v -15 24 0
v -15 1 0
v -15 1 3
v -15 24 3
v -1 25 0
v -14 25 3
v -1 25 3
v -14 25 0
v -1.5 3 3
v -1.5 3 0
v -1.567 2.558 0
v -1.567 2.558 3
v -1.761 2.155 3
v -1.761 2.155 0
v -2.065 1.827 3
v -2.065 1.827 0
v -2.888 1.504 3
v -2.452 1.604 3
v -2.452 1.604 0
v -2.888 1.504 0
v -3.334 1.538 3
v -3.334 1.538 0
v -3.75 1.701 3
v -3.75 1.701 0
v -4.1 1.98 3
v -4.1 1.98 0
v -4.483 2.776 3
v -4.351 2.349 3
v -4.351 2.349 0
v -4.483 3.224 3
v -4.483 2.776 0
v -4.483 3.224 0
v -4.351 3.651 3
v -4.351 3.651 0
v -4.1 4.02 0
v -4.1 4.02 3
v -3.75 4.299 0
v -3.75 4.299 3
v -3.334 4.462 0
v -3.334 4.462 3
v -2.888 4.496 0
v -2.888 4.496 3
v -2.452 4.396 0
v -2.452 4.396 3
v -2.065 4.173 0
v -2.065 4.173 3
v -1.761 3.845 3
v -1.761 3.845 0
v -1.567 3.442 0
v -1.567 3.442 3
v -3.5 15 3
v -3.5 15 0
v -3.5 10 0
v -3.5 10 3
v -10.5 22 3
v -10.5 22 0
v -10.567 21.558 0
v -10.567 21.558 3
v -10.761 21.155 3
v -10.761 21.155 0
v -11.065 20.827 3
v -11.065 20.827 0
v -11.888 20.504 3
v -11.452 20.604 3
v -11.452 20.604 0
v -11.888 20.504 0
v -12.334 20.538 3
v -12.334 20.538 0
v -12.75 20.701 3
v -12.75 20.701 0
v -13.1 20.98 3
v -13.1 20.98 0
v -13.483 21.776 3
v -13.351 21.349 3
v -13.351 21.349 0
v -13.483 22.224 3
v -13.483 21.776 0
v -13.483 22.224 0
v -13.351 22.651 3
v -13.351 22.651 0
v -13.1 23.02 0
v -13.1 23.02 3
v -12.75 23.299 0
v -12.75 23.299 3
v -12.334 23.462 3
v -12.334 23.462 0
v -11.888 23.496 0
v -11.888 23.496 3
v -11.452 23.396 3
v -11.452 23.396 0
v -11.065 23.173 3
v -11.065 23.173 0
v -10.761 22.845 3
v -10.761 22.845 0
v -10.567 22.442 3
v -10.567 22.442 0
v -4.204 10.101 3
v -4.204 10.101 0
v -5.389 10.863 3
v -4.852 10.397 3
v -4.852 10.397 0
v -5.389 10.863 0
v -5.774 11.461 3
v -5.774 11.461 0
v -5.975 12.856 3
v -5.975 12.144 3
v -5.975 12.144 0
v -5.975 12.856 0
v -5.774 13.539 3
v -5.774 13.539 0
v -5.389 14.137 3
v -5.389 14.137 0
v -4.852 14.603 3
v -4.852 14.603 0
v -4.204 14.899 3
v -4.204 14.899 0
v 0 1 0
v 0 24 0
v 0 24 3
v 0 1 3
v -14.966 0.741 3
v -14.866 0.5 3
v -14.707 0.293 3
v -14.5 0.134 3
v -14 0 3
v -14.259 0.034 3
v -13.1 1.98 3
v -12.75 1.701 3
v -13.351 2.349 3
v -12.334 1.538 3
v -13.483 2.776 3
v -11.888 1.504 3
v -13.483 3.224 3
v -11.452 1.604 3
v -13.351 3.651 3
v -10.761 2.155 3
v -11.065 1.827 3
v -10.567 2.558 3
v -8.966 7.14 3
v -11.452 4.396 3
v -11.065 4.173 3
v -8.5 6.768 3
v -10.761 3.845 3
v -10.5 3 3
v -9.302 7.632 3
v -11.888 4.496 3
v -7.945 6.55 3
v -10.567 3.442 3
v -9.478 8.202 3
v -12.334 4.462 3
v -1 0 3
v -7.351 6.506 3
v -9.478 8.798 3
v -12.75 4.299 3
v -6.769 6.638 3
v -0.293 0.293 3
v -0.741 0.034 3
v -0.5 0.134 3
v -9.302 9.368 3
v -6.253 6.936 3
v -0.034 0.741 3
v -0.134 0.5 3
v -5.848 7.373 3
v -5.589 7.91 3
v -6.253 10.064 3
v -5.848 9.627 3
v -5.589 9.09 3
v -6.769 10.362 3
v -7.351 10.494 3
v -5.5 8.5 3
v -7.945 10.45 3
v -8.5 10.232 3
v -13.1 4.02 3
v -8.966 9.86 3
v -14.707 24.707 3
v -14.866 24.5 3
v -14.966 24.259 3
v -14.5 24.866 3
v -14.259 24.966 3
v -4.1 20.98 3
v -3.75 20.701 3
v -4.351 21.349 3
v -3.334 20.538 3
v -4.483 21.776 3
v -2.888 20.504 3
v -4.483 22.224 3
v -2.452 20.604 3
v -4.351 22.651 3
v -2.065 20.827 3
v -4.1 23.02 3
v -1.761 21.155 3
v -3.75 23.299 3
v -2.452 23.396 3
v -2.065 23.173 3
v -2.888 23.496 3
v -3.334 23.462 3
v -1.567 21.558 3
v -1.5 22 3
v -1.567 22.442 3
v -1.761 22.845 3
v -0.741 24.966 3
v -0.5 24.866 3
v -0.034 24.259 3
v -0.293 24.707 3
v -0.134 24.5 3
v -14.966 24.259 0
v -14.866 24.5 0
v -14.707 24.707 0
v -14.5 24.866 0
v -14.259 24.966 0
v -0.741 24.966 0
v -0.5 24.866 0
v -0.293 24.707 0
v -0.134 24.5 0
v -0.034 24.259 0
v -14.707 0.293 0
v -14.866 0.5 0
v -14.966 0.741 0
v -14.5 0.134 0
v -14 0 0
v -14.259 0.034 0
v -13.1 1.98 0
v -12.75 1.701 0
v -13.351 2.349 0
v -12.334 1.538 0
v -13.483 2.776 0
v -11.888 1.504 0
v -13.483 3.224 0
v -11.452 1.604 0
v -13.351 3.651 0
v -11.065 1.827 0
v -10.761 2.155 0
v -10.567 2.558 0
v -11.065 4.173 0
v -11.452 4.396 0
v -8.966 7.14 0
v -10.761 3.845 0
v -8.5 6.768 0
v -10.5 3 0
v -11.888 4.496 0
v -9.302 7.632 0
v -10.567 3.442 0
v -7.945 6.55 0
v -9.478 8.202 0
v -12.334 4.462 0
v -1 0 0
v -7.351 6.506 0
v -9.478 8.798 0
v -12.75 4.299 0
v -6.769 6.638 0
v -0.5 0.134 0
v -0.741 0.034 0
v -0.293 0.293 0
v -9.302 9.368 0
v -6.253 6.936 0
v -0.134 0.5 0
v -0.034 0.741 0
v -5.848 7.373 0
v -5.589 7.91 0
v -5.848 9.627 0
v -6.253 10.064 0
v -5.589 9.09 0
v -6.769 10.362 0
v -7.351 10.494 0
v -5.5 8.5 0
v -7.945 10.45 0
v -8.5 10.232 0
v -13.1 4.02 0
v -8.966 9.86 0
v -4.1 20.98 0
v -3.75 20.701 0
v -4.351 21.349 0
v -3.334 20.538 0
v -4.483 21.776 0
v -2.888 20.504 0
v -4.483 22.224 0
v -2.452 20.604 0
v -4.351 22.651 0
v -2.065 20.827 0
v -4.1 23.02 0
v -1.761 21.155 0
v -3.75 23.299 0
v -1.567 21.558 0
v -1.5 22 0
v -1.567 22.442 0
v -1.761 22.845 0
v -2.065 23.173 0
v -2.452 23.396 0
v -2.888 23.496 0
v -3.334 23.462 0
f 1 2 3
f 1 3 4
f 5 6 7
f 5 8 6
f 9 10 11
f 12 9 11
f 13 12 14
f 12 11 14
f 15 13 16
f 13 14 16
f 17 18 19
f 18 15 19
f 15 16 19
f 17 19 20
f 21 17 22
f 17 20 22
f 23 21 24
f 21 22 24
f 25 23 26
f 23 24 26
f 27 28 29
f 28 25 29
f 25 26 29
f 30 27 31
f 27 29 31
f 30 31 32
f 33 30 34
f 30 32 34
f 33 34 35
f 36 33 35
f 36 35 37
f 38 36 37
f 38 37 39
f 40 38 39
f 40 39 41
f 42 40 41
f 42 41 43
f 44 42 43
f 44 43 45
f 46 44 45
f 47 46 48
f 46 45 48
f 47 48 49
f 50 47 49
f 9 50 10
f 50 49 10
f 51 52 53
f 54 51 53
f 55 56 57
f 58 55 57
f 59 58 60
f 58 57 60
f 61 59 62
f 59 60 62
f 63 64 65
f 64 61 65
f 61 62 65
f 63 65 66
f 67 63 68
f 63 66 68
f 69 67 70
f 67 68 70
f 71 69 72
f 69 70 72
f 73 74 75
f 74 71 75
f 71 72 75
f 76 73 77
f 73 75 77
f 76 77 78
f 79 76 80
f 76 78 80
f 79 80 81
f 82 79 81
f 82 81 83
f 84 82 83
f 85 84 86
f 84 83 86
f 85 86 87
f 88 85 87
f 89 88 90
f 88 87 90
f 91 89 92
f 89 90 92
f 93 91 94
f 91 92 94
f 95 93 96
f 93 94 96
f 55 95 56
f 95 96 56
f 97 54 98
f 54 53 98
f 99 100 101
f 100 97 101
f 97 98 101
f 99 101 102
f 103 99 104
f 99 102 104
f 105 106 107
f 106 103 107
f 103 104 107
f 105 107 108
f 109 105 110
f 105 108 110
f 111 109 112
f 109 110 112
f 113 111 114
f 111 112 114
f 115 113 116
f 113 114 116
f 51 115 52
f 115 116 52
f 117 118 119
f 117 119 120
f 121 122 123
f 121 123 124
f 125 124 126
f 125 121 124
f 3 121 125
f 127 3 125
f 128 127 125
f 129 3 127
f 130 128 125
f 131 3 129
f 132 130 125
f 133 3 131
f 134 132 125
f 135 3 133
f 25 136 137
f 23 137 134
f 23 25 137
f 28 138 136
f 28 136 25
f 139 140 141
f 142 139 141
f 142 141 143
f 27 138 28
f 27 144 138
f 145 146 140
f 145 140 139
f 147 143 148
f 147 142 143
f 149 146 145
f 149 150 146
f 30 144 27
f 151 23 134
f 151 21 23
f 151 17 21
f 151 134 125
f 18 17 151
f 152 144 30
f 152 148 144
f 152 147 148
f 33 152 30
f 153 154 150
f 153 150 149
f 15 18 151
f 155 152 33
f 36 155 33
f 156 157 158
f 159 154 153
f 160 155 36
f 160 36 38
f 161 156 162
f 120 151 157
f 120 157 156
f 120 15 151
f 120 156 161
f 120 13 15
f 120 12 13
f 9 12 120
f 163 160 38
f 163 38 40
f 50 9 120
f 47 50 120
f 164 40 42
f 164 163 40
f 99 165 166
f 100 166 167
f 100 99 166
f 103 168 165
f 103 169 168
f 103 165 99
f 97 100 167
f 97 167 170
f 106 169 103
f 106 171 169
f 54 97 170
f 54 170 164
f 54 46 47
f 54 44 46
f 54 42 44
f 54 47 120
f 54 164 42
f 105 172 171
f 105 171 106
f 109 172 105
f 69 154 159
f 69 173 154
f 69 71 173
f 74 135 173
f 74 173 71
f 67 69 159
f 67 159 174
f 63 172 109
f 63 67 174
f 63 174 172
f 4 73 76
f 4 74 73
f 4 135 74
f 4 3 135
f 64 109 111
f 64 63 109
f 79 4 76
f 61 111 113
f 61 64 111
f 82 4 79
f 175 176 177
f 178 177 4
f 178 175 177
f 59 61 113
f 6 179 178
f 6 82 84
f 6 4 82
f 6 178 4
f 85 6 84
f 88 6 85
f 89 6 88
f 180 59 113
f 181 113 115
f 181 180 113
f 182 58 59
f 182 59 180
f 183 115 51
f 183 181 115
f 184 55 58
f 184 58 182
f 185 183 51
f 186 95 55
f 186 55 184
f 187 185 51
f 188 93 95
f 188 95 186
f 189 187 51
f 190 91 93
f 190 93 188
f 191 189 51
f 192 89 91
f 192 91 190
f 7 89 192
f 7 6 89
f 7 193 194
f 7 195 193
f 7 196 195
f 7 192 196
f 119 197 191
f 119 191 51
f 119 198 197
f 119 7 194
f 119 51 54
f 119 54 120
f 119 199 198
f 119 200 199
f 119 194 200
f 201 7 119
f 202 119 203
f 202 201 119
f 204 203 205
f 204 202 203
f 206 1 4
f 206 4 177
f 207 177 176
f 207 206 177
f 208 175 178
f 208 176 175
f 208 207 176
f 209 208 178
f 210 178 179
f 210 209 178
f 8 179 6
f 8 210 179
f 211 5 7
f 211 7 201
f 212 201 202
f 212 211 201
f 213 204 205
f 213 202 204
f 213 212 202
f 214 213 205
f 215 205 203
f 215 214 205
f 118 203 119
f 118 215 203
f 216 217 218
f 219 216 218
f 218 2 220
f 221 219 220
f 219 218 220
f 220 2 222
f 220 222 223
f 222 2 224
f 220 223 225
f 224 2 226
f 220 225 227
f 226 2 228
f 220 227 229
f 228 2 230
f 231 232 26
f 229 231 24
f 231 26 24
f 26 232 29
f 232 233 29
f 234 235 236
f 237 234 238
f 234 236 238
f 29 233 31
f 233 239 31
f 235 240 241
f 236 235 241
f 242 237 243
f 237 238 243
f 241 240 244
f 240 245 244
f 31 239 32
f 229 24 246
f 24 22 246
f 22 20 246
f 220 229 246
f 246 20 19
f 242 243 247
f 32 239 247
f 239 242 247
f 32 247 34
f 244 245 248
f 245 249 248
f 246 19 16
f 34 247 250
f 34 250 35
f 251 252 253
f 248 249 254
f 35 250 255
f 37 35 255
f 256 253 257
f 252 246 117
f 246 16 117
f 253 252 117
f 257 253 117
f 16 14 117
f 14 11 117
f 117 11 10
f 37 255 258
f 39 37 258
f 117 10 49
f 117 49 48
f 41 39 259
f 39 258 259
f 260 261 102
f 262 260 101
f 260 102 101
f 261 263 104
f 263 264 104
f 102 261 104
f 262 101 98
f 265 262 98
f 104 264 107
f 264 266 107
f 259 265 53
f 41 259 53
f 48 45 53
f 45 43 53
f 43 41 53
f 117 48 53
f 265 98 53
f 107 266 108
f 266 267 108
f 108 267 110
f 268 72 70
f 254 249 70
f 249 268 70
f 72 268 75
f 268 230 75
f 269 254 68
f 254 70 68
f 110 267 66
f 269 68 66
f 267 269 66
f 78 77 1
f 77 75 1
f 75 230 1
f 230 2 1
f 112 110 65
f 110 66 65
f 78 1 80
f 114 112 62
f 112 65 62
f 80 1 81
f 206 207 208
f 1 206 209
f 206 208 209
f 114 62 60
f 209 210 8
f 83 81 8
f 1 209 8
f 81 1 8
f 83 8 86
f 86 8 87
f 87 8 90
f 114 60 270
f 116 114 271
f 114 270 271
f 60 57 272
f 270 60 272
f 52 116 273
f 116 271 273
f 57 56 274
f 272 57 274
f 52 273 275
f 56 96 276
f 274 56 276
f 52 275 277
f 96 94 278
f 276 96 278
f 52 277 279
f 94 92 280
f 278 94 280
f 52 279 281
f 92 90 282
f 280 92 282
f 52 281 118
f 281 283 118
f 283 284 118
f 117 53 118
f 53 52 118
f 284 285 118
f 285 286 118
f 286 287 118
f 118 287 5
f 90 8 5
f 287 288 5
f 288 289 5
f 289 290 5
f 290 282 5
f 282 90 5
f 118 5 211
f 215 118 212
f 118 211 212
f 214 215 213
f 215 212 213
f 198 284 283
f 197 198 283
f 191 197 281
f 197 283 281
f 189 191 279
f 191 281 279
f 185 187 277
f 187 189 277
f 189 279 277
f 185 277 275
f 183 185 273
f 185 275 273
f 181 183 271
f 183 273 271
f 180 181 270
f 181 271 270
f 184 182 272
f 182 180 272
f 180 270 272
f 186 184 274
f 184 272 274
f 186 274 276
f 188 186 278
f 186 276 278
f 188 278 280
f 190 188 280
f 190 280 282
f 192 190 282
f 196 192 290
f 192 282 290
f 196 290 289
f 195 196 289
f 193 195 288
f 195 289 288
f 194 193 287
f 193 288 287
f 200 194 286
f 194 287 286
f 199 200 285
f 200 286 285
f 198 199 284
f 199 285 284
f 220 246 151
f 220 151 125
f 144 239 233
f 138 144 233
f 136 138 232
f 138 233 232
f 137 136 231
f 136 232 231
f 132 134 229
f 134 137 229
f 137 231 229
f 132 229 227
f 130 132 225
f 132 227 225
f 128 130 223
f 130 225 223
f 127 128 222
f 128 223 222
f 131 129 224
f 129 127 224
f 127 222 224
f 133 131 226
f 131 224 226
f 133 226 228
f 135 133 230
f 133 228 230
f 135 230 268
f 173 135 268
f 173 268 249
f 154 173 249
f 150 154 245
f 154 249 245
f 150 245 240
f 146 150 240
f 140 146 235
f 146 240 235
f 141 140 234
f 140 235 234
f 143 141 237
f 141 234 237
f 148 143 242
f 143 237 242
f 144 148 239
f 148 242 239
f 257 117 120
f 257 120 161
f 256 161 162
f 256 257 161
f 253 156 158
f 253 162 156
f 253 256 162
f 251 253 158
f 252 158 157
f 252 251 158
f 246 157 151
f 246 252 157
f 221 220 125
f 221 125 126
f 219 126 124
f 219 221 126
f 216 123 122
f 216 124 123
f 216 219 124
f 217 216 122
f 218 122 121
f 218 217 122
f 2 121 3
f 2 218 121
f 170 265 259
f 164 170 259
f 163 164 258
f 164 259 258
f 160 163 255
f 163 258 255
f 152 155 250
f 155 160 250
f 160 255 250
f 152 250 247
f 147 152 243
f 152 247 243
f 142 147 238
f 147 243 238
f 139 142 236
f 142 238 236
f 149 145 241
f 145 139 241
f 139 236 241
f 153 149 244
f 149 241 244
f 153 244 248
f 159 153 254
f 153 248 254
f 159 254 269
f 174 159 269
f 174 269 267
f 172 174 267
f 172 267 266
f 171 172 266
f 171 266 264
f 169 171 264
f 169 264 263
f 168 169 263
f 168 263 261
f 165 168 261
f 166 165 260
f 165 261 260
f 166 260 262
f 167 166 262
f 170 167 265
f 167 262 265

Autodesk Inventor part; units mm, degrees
ref_plane "YZ Plane" through (0, 0, 0) normal (1, 0, 0) x (0, 1, 0)
ref_plane "XZ Plane" through (0, 0, 0) normal (0, 1, 0) x (-1, 0, 0)
ref_plane "XY Plane" through (0, 0, 0) normal (0, 0, 1) x (1, 0, 0)
sketch "Szkic1" plane through (0, 0, 0) normal (0, 0, 1) x (1, 0, 0)
  line L0 (-1, 0) -> (-14, 0)
  line L1 (-15, 1) -> (-15, 24)
  line L2 (-14, 25) -> (-1, 25)
  line L3 (0, 24) -> (0, 1)
  arc A0 (-14, 25) -> (-15, 24) centre (-14, 24) ccw
  arc A1 (0, 24) -> (-1, 25) centre (-1, 24) ccw
  arc A2 (-1, 0) -> (0, 1) centre (-1, 1) ccw
  arc A3 (-15, 1) -> (-14, 0) centre (-14, 1) ccw
  circle A4 centre (-3, 3) radius 1.5
  circle A5 centre (-12, 3) radius 1.5
  circle A6 centre (-12, 22) radius 1.5
  circle A7 centre (-3, 22) radius 1.5
  line L4 (-3.5, 15) -> (-3.5, 10)
  circle A8 centre (-7.5, 8.5) radius 2
  arc A9 (-3.5, 15) -> (-3.5, 10) centre (-3.5, 12.5) ccw
  point P0 (0, 0)
  point P1 (-15, 25)
  point P2 (-15, 0)
  point P3 (0, 25)
  point P4 (-11.5, 20.5)
  point P5 (-11.5, 4.5)
  point P6 (-3.5, 20.5)
  dimension "d0" = 15
  dimension "d1" = 25
  dimension "d2" = 1
  dimension "d3" = 3
  dimension "d4" = 3
  dimension "d5" = 3
  dimension "d6" = 3
  dimension "d7" = 8
  dimension "d8" = 16
  dimension "d10" = 19
  dimension "d11" = 4
extrude "Wyciągnięcie proste1" add sketch "Szkic1" along normal blind 3
sketch "Szkic2" plane through (0, 0, 3) normal (0, 0, 1) x (1, 0, 0)
  point P0 (0, 0)
sketch "Szkic3" plane through (0, 0, 3) normal (0, 0, 1) x (1, 0, 0)
  point P0 (0, 0)
sketch "Szkic4" plane through (0, 0, 3) normal (0, 0, 1) x (1, 0, 0)
  point P0 (0, 0)
properties part number "zad 7"
